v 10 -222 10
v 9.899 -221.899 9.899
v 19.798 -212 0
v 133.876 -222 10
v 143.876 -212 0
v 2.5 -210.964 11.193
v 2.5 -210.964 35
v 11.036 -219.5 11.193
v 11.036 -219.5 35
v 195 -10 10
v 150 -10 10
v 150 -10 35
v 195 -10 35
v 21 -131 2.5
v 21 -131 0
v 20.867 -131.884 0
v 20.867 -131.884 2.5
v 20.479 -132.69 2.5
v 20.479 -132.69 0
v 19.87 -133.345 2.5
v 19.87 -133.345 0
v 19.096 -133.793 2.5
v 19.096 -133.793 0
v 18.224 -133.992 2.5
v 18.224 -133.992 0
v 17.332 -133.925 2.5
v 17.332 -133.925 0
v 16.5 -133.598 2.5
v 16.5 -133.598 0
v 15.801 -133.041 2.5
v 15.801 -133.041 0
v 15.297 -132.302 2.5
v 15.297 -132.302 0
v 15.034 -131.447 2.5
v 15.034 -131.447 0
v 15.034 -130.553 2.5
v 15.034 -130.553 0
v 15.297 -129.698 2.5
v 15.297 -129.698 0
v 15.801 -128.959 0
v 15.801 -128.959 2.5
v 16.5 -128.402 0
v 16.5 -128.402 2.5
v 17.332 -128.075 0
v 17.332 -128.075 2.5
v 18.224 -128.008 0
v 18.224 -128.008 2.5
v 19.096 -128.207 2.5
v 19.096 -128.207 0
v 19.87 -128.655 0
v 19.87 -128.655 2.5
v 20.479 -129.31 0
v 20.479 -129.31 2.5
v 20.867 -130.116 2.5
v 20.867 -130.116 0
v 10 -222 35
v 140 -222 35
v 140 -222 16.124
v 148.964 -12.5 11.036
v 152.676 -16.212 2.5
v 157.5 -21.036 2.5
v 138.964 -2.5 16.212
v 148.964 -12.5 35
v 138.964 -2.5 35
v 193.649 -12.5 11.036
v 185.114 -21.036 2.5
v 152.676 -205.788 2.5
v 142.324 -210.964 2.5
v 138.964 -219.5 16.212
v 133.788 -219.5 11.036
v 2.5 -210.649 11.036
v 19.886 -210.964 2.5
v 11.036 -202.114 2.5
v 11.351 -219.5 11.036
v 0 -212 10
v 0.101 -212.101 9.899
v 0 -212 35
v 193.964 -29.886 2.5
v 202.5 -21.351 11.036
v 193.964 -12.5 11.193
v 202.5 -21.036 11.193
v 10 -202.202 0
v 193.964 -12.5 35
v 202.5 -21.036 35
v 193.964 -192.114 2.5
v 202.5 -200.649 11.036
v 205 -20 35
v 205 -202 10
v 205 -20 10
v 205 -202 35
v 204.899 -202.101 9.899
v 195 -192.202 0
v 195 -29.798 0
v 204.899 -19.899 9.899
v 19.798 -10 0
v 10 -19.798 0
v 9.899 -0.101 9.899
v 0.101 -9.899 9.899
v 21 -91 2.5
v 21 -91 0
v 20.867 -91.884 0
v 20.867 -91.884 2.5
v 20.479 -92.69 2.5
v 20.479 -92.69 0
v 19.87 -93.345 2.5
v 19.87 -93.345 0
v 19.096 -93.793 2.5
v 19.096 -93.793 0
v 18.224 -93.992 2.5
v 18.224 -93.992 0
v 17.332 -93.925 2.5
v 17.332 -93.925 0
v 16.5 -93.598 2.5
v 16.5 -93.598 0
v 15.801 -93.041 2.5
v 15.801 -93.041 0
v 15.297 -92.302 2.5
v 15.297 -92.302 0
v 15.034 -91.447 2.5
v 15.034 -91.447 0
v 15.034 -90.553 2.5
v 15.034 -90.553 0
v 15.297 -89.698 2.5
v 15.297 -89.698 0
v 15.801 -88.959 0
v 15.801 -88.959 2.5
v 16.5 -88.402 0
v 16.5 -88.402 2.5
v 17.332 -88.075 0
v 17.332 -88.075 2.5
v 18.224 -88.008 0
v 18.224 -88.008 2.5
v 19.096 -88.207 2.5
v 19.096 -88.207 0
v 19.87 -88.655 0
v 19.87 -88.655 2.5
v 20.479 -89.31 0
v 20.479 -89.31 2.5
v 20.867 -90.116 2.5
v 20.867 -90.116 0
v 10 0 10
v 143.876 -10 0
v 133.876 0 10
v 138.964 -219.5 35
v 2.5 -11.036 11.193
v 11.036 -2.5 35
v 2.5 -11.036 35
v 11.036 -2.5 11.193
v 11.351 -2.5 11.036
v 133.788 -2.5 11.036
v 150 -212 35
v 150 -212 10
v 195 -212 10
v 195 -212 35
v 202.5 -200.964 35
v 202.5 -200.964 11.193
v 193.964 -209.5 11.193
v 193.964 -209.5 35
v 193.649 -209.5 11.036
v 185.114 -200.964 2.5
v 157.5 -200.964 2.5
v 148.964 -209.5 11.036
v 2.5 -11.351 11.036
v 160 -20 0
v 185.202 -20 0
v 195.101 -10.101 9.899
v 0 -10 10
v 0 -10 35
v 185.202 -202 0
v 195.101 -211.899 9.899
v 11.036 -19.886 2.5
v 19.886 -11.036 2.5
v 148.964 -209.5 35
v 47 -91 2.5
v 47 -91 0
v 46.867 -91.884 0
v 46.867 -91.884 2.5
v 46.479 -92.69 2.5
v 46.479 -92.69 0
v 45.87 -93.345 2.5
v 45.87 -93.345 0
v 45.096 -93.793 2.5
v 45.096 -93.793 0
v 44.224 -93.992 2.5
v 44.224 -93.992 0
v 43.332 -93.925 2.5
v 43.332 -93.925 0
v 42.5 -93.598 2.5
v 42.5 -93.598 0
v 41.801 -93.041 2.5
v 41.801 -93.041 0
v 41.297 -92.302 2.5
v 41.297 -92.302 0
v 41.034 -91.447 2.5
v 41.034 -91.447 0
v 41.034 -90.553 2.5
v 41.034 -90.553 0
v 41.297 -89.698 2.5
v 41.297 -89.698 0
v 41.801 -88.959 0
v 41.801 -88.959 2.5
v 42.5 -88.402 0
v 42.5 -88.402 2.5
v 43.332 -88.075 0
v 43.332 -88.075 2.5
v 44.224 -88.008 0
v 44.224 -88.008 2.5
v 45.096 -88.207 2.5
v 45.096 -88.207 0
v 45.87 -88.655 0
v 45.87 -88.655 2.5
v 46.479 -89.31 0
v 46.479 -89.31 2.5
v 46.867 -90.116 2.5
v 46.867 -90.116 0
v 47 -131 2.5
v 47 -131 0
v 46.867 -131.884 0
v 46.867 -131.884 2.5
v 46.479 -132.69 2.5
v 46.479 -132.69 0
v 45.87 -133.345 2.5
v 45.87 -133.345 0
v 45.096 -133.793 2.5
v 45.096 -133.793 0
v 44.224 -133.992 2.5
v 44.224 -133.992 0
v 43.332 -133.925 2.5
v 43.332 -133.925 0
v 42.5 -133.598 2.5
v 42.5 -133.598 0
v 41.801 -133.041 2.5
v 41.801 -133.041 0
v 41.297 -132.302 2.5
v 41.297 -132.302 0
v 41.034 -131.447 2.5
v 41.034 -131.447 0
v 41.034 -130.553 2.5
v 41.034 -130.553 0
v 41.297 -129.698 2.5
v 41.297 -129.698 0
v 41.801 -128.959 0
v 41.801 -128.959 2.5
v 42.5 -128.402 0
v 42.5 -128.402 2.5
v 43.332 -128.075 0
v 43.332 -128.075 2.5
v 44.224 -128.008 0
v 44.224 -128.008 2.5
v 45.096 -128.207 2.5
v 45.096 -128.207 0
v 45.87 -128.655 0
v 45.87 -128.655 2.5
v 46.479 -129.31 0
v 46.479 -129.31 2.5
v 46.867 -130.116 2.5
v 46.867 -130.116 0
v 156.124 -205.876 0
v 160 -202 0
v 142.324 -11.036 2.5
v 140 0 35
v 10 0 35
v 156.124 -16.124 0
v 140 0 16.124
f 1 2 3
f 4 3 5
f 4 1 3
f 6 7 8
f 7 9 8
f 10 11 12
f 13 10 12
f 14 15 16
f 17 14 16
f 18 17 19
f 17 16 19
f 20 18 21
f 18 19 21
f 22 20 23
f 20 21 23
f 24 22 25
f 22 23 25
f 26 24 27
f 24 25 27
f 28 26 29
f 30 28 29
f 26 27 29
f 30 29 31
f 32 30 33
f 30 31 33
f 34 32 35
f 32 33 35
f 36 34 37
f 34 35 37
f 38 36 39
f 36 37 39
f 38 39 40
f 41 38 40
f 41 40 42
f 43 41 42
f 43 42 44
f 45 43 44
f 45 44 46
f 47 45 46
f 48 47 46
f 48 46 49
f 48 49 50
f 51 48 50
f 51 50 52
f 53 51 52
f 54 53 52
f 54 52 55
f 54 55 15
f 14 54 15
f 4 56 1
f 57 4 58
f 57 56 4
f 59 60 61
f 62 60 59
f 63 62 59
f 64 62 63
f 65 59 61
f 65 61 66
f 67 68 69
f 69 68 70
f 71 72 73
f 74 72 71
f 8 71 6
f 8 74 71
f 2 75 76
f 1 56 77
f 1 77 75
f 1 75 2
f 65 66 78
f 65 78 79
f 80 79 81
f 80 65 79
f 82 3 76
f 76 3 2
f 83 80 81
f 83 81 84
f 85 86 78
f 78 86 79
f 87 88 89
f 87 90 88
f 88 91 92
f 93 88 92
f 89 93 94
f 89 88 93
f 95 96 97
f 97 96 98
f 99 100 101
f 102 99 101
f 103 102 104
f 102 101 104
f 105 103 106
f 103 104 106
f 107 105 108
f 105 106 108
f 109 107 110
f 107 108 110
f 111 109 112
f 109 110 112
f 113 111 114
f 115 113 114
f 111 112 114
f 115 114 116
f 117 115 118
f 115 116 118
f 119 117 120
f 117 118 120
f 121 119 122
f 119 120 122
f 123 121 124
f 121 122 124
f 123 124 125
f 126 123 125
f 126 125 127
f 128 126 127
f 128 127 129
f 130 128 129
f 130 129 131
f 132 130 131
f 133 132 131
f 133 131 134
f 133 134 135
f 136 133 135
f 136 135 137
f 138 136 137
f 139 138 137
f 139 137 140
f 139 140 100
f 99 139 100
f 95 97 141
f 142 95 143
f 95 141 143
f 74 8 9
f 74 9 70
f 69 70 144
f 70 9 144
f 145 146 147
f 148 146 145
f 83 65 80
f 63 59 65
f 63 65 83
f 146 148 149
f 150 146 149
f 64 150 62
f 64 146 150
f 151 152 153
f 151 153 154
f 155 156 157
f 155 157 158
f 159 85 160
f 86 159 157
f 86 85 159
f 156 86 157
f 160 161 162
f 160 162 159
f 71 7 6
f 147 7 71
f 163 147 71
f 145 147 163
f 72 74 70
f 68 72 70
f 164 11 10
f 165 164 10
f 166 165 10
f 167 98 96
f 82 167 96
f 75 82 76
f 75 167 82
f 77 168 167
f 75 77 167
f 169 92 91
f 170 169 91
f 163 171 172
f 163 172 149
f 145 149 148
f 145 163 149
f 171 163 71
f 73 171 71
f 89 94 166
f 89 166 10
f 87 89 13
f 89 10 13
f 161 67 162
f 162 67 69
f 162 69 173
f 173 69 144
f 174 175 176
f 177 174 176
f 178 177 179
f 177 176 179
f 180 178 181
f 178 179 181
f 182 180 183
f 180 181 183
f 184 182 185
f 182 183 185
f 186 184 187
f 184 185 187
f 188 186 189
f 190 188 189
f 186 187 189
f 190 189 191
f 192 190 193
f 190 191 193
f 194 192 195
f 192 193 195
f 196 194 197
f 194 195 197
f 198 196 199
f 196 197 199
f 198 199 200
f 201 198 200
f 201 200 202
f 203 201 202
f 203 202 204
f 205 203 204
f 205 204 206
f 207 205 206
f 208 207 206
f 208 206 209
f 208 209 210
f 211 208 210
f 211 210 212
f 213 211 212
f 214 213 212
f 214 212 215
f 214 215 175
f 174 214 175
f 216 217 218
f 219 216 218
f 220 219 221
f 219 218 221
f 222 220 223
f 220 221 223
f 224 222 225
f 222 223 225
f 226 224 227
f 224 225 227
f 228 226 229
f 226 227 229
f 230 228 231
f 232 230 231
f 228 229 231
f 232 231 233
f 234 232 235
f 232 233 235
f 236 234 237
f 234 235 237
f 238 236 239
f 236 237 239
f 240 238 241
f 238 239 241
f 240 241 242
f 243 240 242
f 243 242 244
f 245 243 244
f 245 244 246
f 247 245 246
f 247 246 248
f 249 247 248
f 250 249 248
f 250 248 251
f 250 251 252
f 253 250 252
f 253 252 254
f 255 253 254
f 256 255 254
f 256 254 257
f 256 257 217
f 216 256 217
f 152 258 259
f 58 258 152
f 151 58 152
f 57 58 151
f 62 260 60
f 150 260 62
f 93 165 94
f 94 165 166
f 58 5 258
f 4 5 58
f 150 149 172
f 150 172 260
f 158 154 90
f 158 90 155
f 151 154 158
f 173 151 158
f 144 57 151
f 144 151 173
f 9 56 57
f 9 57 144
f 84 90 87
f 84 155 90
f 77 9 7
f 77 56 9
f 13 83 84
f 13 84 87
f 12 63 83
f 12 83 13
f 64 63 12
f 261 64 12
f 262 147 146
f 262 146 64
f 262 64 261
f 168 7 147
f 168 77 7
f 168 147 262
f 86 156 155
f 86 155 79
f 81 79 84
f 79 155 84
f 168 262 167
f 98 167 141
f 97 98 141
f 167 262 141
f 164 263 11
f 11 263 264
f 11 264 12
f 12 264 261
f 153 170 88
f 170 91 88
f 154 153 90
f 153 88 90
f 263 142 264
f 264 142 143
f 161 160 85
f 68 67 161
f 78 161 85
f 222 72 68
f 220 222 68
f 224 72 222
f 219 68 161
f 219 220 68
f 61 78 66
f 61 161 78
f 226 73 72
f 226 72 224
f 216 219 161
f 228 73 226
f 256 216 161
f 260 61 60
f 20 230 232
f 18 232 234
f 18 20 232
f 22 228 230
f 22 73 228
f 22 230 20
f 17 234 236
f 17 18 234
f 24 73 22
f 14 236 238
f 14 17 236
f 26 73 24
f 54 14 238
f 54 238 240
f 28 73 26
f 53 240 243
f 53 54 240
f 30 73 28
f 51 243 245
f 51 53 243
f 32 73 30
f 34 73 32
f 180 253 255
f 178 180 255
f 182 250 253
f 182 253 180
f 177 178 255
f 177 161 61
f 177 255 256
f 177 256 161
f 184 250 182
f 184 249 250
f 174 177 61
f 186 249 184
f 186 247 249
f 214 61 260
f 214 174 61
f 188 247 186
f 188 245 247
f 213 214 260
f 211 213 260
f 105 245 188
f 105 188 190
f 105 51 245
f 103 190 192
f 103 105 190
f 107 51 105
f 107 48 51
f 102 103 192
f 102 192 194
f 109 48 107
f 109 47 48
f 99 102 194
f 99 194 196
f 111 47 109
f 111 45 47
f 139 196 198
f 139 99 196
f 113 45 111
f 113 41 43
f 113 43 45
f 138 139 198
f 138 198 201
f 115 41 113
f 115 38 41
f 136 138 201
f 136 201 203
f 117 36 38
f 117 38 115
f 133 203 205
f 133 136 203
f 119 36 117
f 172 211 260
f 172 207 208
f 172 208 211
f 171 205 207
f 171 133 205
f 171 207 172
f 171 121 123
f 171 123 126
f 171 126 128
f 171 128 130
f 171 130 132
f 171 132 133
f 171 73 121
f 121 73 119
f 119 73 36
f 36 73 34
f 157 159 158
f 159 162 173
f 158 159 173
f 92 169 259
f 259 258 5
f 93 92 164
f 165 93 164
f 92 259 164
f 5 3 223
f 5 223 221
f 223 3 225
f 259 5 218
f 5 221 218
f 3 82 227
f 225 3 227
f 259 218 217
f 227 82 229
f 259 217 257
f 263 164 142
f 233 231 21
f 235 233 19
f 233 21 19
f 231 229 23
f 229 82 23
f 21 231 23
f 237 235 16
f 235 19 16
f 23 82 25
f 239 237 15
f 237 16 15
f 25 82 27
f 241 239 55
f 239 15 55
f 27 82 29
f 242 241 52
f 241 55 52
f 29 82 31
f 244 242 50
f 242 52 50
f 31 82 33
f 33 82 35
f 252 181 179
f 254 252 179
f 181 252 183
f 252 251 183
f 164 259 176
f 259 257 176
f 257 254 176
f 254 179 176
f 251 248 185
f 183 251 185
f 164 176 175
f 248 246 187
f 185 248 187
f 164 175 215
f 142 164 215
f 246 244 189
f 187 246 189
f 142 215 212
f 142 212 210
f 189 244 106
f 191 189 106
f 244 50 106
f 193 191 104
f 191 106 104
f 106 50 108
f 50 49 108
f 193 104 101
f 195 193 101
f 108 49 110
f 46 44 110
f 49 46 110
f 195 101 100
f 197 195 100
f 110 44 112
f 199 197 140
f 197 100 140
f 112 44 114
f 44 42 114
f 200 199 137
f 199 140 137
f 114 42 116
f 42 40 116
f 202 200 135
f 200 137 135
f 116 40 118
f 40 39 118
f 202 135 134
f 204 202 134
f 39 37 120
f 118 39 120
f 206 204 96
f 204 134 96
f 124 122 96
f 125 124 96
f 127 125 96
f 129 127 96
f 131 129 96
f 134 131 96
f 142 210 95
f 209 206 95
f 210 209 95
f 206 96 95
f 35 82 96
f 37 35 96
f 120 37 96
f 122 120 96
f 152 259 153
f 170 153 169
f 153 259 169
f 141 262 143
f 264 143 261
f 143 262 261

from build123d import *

# Parameters (mm, degrees)
F1_DEPTH  = 222
F2_SIZE   = 10
F3_SIZE   = 10
F4_SIZE   = 8
F6_W      = 202
F6_H      = 35
F7_DEPTH  = 55
F8_SIZE   = 10
F9_SIZE   = 10
F10_SIZE  = 5
F11_SIZE  = 8
F12_T     = -2.5
F5_R      = 3
F13_DEPTH = 35.001


with BuildPart() as f1:
    # F0 (on Front) → F1 (new body)
    with BuildSketch(Plane.XZ):
        Polygon((0, 0), (10, 0), (140, 0), (150, 0), (150, 10), (150, 35), (0, 35), (0, 10), align=None)
    extrude(amount=F1_DEPTH)

    # F2
    f2_edges = [f1.edges().sort_by_distance(p)[0] for p in [
        (0, -222, 17.5),
        (150, -222, 17.5),
        (150, 0, 17.5),
        (0, 0, 17.5),
    ]]
    chamfer(f2_edges, length=F2_SIZE)

    # F3 (call 1 of 3: OpenCascade refuses the feature's edges together)
    f3_edges = [f1.edges().sort_by_distance(p)[0] for p in [
        (75, -222, 0),
    ]]
    chamfer(f3_edges, length=F3_SIZE)

    # F3#2 (call 2 of 3)
    f3_2_edges = [f1.edges().sort_by_distance(p)[0] for p in [
        (75, 0, 0),
    ]]
    chamfer(f3_2_edges, length=F3_SIZE)

    # F3#3 (call 3 of 3)
    f3_3_edges = [f1.edges().sort_by_distance(p)[0] for p in [
        (0, -111, 0),
    ]]
    chamfer(f3_3_edges, length=F3_SIZE)

    # F4
    f4_edges = [f1.edges().sort_by_distance(p)[0] for p in [
        (7.5, -214.5, 2.5),
        (7.5, -7.5, 2.5),
    ]]
    chamfer(f4_edges, length=F4_SIZE)

    # F6 (on face) → F7 (join)
    with BuildSketch(Plane.YZ.offset(150)):
        with Locations((-111, 17.5)):
            Rectangle(F6_W, F6_H)
    extrude(amount=F7_DEPTH)

    # F8
    f8_edges = [f1.edges().sort_by_distance(p)[0] for p in [
        (205, -111, 0),
        (177.5, -212, 0),
        (177.5, -10, 0),
    ]]
    chamfer(f8_edges, length=F8_SIZE)

    # F9
    f9_edges = [f1.edges().sort_by_distance(p)[0] for p in [
        (205, -212, 22.5),
        (205, -10, 22.5),
    ]]
    chamfer(f9_edges, length=F9_SIZE)

    # F10
    f10_edges = [f1.edges().sort_by_distance(p)[0] for p in [
        (145, -217, 5),
        (145, -5, 5),
    ]]
    chamfer(f10_edges, length=F10_SIZE)

    # F11
    f11_edges = [f1.edges().sort_by_distance(p)[0] for p in [
        (197.5, -17.5, 2.5),
        (197.5, -204.5, 2.5),
    ]]
    chamfer(f11_edges, length=F11_SIZE)

    # F12
    f12_openings = [f1.faces().sort_by_distance(p)[0] for p in [
        (100.529547, -111, 35),
    ]]
    offset(amount=F12_T, openings=f12_openings, kind=Kind.INTERSECTION)

    # F5 (on face) → F13 (cut, through all)
    with BuildSketch(Plane(origin=(0, 0, 0), x_dir=(1, 0, 0), z_dir=(0, 0, -1))):
        with Locations((18, 131)):
            Circle(F5_R)
        with Locations((44, 131)):
            Circle(F5_R)
        with Locations((44, 91)):
            Circle(F5_R)
        with Locations((18, 91)):
            Circle(F5_R)
    extrude(amount=-F13_DEPTH, mode=Mode.SUBTRACT)


solid = f1.part
